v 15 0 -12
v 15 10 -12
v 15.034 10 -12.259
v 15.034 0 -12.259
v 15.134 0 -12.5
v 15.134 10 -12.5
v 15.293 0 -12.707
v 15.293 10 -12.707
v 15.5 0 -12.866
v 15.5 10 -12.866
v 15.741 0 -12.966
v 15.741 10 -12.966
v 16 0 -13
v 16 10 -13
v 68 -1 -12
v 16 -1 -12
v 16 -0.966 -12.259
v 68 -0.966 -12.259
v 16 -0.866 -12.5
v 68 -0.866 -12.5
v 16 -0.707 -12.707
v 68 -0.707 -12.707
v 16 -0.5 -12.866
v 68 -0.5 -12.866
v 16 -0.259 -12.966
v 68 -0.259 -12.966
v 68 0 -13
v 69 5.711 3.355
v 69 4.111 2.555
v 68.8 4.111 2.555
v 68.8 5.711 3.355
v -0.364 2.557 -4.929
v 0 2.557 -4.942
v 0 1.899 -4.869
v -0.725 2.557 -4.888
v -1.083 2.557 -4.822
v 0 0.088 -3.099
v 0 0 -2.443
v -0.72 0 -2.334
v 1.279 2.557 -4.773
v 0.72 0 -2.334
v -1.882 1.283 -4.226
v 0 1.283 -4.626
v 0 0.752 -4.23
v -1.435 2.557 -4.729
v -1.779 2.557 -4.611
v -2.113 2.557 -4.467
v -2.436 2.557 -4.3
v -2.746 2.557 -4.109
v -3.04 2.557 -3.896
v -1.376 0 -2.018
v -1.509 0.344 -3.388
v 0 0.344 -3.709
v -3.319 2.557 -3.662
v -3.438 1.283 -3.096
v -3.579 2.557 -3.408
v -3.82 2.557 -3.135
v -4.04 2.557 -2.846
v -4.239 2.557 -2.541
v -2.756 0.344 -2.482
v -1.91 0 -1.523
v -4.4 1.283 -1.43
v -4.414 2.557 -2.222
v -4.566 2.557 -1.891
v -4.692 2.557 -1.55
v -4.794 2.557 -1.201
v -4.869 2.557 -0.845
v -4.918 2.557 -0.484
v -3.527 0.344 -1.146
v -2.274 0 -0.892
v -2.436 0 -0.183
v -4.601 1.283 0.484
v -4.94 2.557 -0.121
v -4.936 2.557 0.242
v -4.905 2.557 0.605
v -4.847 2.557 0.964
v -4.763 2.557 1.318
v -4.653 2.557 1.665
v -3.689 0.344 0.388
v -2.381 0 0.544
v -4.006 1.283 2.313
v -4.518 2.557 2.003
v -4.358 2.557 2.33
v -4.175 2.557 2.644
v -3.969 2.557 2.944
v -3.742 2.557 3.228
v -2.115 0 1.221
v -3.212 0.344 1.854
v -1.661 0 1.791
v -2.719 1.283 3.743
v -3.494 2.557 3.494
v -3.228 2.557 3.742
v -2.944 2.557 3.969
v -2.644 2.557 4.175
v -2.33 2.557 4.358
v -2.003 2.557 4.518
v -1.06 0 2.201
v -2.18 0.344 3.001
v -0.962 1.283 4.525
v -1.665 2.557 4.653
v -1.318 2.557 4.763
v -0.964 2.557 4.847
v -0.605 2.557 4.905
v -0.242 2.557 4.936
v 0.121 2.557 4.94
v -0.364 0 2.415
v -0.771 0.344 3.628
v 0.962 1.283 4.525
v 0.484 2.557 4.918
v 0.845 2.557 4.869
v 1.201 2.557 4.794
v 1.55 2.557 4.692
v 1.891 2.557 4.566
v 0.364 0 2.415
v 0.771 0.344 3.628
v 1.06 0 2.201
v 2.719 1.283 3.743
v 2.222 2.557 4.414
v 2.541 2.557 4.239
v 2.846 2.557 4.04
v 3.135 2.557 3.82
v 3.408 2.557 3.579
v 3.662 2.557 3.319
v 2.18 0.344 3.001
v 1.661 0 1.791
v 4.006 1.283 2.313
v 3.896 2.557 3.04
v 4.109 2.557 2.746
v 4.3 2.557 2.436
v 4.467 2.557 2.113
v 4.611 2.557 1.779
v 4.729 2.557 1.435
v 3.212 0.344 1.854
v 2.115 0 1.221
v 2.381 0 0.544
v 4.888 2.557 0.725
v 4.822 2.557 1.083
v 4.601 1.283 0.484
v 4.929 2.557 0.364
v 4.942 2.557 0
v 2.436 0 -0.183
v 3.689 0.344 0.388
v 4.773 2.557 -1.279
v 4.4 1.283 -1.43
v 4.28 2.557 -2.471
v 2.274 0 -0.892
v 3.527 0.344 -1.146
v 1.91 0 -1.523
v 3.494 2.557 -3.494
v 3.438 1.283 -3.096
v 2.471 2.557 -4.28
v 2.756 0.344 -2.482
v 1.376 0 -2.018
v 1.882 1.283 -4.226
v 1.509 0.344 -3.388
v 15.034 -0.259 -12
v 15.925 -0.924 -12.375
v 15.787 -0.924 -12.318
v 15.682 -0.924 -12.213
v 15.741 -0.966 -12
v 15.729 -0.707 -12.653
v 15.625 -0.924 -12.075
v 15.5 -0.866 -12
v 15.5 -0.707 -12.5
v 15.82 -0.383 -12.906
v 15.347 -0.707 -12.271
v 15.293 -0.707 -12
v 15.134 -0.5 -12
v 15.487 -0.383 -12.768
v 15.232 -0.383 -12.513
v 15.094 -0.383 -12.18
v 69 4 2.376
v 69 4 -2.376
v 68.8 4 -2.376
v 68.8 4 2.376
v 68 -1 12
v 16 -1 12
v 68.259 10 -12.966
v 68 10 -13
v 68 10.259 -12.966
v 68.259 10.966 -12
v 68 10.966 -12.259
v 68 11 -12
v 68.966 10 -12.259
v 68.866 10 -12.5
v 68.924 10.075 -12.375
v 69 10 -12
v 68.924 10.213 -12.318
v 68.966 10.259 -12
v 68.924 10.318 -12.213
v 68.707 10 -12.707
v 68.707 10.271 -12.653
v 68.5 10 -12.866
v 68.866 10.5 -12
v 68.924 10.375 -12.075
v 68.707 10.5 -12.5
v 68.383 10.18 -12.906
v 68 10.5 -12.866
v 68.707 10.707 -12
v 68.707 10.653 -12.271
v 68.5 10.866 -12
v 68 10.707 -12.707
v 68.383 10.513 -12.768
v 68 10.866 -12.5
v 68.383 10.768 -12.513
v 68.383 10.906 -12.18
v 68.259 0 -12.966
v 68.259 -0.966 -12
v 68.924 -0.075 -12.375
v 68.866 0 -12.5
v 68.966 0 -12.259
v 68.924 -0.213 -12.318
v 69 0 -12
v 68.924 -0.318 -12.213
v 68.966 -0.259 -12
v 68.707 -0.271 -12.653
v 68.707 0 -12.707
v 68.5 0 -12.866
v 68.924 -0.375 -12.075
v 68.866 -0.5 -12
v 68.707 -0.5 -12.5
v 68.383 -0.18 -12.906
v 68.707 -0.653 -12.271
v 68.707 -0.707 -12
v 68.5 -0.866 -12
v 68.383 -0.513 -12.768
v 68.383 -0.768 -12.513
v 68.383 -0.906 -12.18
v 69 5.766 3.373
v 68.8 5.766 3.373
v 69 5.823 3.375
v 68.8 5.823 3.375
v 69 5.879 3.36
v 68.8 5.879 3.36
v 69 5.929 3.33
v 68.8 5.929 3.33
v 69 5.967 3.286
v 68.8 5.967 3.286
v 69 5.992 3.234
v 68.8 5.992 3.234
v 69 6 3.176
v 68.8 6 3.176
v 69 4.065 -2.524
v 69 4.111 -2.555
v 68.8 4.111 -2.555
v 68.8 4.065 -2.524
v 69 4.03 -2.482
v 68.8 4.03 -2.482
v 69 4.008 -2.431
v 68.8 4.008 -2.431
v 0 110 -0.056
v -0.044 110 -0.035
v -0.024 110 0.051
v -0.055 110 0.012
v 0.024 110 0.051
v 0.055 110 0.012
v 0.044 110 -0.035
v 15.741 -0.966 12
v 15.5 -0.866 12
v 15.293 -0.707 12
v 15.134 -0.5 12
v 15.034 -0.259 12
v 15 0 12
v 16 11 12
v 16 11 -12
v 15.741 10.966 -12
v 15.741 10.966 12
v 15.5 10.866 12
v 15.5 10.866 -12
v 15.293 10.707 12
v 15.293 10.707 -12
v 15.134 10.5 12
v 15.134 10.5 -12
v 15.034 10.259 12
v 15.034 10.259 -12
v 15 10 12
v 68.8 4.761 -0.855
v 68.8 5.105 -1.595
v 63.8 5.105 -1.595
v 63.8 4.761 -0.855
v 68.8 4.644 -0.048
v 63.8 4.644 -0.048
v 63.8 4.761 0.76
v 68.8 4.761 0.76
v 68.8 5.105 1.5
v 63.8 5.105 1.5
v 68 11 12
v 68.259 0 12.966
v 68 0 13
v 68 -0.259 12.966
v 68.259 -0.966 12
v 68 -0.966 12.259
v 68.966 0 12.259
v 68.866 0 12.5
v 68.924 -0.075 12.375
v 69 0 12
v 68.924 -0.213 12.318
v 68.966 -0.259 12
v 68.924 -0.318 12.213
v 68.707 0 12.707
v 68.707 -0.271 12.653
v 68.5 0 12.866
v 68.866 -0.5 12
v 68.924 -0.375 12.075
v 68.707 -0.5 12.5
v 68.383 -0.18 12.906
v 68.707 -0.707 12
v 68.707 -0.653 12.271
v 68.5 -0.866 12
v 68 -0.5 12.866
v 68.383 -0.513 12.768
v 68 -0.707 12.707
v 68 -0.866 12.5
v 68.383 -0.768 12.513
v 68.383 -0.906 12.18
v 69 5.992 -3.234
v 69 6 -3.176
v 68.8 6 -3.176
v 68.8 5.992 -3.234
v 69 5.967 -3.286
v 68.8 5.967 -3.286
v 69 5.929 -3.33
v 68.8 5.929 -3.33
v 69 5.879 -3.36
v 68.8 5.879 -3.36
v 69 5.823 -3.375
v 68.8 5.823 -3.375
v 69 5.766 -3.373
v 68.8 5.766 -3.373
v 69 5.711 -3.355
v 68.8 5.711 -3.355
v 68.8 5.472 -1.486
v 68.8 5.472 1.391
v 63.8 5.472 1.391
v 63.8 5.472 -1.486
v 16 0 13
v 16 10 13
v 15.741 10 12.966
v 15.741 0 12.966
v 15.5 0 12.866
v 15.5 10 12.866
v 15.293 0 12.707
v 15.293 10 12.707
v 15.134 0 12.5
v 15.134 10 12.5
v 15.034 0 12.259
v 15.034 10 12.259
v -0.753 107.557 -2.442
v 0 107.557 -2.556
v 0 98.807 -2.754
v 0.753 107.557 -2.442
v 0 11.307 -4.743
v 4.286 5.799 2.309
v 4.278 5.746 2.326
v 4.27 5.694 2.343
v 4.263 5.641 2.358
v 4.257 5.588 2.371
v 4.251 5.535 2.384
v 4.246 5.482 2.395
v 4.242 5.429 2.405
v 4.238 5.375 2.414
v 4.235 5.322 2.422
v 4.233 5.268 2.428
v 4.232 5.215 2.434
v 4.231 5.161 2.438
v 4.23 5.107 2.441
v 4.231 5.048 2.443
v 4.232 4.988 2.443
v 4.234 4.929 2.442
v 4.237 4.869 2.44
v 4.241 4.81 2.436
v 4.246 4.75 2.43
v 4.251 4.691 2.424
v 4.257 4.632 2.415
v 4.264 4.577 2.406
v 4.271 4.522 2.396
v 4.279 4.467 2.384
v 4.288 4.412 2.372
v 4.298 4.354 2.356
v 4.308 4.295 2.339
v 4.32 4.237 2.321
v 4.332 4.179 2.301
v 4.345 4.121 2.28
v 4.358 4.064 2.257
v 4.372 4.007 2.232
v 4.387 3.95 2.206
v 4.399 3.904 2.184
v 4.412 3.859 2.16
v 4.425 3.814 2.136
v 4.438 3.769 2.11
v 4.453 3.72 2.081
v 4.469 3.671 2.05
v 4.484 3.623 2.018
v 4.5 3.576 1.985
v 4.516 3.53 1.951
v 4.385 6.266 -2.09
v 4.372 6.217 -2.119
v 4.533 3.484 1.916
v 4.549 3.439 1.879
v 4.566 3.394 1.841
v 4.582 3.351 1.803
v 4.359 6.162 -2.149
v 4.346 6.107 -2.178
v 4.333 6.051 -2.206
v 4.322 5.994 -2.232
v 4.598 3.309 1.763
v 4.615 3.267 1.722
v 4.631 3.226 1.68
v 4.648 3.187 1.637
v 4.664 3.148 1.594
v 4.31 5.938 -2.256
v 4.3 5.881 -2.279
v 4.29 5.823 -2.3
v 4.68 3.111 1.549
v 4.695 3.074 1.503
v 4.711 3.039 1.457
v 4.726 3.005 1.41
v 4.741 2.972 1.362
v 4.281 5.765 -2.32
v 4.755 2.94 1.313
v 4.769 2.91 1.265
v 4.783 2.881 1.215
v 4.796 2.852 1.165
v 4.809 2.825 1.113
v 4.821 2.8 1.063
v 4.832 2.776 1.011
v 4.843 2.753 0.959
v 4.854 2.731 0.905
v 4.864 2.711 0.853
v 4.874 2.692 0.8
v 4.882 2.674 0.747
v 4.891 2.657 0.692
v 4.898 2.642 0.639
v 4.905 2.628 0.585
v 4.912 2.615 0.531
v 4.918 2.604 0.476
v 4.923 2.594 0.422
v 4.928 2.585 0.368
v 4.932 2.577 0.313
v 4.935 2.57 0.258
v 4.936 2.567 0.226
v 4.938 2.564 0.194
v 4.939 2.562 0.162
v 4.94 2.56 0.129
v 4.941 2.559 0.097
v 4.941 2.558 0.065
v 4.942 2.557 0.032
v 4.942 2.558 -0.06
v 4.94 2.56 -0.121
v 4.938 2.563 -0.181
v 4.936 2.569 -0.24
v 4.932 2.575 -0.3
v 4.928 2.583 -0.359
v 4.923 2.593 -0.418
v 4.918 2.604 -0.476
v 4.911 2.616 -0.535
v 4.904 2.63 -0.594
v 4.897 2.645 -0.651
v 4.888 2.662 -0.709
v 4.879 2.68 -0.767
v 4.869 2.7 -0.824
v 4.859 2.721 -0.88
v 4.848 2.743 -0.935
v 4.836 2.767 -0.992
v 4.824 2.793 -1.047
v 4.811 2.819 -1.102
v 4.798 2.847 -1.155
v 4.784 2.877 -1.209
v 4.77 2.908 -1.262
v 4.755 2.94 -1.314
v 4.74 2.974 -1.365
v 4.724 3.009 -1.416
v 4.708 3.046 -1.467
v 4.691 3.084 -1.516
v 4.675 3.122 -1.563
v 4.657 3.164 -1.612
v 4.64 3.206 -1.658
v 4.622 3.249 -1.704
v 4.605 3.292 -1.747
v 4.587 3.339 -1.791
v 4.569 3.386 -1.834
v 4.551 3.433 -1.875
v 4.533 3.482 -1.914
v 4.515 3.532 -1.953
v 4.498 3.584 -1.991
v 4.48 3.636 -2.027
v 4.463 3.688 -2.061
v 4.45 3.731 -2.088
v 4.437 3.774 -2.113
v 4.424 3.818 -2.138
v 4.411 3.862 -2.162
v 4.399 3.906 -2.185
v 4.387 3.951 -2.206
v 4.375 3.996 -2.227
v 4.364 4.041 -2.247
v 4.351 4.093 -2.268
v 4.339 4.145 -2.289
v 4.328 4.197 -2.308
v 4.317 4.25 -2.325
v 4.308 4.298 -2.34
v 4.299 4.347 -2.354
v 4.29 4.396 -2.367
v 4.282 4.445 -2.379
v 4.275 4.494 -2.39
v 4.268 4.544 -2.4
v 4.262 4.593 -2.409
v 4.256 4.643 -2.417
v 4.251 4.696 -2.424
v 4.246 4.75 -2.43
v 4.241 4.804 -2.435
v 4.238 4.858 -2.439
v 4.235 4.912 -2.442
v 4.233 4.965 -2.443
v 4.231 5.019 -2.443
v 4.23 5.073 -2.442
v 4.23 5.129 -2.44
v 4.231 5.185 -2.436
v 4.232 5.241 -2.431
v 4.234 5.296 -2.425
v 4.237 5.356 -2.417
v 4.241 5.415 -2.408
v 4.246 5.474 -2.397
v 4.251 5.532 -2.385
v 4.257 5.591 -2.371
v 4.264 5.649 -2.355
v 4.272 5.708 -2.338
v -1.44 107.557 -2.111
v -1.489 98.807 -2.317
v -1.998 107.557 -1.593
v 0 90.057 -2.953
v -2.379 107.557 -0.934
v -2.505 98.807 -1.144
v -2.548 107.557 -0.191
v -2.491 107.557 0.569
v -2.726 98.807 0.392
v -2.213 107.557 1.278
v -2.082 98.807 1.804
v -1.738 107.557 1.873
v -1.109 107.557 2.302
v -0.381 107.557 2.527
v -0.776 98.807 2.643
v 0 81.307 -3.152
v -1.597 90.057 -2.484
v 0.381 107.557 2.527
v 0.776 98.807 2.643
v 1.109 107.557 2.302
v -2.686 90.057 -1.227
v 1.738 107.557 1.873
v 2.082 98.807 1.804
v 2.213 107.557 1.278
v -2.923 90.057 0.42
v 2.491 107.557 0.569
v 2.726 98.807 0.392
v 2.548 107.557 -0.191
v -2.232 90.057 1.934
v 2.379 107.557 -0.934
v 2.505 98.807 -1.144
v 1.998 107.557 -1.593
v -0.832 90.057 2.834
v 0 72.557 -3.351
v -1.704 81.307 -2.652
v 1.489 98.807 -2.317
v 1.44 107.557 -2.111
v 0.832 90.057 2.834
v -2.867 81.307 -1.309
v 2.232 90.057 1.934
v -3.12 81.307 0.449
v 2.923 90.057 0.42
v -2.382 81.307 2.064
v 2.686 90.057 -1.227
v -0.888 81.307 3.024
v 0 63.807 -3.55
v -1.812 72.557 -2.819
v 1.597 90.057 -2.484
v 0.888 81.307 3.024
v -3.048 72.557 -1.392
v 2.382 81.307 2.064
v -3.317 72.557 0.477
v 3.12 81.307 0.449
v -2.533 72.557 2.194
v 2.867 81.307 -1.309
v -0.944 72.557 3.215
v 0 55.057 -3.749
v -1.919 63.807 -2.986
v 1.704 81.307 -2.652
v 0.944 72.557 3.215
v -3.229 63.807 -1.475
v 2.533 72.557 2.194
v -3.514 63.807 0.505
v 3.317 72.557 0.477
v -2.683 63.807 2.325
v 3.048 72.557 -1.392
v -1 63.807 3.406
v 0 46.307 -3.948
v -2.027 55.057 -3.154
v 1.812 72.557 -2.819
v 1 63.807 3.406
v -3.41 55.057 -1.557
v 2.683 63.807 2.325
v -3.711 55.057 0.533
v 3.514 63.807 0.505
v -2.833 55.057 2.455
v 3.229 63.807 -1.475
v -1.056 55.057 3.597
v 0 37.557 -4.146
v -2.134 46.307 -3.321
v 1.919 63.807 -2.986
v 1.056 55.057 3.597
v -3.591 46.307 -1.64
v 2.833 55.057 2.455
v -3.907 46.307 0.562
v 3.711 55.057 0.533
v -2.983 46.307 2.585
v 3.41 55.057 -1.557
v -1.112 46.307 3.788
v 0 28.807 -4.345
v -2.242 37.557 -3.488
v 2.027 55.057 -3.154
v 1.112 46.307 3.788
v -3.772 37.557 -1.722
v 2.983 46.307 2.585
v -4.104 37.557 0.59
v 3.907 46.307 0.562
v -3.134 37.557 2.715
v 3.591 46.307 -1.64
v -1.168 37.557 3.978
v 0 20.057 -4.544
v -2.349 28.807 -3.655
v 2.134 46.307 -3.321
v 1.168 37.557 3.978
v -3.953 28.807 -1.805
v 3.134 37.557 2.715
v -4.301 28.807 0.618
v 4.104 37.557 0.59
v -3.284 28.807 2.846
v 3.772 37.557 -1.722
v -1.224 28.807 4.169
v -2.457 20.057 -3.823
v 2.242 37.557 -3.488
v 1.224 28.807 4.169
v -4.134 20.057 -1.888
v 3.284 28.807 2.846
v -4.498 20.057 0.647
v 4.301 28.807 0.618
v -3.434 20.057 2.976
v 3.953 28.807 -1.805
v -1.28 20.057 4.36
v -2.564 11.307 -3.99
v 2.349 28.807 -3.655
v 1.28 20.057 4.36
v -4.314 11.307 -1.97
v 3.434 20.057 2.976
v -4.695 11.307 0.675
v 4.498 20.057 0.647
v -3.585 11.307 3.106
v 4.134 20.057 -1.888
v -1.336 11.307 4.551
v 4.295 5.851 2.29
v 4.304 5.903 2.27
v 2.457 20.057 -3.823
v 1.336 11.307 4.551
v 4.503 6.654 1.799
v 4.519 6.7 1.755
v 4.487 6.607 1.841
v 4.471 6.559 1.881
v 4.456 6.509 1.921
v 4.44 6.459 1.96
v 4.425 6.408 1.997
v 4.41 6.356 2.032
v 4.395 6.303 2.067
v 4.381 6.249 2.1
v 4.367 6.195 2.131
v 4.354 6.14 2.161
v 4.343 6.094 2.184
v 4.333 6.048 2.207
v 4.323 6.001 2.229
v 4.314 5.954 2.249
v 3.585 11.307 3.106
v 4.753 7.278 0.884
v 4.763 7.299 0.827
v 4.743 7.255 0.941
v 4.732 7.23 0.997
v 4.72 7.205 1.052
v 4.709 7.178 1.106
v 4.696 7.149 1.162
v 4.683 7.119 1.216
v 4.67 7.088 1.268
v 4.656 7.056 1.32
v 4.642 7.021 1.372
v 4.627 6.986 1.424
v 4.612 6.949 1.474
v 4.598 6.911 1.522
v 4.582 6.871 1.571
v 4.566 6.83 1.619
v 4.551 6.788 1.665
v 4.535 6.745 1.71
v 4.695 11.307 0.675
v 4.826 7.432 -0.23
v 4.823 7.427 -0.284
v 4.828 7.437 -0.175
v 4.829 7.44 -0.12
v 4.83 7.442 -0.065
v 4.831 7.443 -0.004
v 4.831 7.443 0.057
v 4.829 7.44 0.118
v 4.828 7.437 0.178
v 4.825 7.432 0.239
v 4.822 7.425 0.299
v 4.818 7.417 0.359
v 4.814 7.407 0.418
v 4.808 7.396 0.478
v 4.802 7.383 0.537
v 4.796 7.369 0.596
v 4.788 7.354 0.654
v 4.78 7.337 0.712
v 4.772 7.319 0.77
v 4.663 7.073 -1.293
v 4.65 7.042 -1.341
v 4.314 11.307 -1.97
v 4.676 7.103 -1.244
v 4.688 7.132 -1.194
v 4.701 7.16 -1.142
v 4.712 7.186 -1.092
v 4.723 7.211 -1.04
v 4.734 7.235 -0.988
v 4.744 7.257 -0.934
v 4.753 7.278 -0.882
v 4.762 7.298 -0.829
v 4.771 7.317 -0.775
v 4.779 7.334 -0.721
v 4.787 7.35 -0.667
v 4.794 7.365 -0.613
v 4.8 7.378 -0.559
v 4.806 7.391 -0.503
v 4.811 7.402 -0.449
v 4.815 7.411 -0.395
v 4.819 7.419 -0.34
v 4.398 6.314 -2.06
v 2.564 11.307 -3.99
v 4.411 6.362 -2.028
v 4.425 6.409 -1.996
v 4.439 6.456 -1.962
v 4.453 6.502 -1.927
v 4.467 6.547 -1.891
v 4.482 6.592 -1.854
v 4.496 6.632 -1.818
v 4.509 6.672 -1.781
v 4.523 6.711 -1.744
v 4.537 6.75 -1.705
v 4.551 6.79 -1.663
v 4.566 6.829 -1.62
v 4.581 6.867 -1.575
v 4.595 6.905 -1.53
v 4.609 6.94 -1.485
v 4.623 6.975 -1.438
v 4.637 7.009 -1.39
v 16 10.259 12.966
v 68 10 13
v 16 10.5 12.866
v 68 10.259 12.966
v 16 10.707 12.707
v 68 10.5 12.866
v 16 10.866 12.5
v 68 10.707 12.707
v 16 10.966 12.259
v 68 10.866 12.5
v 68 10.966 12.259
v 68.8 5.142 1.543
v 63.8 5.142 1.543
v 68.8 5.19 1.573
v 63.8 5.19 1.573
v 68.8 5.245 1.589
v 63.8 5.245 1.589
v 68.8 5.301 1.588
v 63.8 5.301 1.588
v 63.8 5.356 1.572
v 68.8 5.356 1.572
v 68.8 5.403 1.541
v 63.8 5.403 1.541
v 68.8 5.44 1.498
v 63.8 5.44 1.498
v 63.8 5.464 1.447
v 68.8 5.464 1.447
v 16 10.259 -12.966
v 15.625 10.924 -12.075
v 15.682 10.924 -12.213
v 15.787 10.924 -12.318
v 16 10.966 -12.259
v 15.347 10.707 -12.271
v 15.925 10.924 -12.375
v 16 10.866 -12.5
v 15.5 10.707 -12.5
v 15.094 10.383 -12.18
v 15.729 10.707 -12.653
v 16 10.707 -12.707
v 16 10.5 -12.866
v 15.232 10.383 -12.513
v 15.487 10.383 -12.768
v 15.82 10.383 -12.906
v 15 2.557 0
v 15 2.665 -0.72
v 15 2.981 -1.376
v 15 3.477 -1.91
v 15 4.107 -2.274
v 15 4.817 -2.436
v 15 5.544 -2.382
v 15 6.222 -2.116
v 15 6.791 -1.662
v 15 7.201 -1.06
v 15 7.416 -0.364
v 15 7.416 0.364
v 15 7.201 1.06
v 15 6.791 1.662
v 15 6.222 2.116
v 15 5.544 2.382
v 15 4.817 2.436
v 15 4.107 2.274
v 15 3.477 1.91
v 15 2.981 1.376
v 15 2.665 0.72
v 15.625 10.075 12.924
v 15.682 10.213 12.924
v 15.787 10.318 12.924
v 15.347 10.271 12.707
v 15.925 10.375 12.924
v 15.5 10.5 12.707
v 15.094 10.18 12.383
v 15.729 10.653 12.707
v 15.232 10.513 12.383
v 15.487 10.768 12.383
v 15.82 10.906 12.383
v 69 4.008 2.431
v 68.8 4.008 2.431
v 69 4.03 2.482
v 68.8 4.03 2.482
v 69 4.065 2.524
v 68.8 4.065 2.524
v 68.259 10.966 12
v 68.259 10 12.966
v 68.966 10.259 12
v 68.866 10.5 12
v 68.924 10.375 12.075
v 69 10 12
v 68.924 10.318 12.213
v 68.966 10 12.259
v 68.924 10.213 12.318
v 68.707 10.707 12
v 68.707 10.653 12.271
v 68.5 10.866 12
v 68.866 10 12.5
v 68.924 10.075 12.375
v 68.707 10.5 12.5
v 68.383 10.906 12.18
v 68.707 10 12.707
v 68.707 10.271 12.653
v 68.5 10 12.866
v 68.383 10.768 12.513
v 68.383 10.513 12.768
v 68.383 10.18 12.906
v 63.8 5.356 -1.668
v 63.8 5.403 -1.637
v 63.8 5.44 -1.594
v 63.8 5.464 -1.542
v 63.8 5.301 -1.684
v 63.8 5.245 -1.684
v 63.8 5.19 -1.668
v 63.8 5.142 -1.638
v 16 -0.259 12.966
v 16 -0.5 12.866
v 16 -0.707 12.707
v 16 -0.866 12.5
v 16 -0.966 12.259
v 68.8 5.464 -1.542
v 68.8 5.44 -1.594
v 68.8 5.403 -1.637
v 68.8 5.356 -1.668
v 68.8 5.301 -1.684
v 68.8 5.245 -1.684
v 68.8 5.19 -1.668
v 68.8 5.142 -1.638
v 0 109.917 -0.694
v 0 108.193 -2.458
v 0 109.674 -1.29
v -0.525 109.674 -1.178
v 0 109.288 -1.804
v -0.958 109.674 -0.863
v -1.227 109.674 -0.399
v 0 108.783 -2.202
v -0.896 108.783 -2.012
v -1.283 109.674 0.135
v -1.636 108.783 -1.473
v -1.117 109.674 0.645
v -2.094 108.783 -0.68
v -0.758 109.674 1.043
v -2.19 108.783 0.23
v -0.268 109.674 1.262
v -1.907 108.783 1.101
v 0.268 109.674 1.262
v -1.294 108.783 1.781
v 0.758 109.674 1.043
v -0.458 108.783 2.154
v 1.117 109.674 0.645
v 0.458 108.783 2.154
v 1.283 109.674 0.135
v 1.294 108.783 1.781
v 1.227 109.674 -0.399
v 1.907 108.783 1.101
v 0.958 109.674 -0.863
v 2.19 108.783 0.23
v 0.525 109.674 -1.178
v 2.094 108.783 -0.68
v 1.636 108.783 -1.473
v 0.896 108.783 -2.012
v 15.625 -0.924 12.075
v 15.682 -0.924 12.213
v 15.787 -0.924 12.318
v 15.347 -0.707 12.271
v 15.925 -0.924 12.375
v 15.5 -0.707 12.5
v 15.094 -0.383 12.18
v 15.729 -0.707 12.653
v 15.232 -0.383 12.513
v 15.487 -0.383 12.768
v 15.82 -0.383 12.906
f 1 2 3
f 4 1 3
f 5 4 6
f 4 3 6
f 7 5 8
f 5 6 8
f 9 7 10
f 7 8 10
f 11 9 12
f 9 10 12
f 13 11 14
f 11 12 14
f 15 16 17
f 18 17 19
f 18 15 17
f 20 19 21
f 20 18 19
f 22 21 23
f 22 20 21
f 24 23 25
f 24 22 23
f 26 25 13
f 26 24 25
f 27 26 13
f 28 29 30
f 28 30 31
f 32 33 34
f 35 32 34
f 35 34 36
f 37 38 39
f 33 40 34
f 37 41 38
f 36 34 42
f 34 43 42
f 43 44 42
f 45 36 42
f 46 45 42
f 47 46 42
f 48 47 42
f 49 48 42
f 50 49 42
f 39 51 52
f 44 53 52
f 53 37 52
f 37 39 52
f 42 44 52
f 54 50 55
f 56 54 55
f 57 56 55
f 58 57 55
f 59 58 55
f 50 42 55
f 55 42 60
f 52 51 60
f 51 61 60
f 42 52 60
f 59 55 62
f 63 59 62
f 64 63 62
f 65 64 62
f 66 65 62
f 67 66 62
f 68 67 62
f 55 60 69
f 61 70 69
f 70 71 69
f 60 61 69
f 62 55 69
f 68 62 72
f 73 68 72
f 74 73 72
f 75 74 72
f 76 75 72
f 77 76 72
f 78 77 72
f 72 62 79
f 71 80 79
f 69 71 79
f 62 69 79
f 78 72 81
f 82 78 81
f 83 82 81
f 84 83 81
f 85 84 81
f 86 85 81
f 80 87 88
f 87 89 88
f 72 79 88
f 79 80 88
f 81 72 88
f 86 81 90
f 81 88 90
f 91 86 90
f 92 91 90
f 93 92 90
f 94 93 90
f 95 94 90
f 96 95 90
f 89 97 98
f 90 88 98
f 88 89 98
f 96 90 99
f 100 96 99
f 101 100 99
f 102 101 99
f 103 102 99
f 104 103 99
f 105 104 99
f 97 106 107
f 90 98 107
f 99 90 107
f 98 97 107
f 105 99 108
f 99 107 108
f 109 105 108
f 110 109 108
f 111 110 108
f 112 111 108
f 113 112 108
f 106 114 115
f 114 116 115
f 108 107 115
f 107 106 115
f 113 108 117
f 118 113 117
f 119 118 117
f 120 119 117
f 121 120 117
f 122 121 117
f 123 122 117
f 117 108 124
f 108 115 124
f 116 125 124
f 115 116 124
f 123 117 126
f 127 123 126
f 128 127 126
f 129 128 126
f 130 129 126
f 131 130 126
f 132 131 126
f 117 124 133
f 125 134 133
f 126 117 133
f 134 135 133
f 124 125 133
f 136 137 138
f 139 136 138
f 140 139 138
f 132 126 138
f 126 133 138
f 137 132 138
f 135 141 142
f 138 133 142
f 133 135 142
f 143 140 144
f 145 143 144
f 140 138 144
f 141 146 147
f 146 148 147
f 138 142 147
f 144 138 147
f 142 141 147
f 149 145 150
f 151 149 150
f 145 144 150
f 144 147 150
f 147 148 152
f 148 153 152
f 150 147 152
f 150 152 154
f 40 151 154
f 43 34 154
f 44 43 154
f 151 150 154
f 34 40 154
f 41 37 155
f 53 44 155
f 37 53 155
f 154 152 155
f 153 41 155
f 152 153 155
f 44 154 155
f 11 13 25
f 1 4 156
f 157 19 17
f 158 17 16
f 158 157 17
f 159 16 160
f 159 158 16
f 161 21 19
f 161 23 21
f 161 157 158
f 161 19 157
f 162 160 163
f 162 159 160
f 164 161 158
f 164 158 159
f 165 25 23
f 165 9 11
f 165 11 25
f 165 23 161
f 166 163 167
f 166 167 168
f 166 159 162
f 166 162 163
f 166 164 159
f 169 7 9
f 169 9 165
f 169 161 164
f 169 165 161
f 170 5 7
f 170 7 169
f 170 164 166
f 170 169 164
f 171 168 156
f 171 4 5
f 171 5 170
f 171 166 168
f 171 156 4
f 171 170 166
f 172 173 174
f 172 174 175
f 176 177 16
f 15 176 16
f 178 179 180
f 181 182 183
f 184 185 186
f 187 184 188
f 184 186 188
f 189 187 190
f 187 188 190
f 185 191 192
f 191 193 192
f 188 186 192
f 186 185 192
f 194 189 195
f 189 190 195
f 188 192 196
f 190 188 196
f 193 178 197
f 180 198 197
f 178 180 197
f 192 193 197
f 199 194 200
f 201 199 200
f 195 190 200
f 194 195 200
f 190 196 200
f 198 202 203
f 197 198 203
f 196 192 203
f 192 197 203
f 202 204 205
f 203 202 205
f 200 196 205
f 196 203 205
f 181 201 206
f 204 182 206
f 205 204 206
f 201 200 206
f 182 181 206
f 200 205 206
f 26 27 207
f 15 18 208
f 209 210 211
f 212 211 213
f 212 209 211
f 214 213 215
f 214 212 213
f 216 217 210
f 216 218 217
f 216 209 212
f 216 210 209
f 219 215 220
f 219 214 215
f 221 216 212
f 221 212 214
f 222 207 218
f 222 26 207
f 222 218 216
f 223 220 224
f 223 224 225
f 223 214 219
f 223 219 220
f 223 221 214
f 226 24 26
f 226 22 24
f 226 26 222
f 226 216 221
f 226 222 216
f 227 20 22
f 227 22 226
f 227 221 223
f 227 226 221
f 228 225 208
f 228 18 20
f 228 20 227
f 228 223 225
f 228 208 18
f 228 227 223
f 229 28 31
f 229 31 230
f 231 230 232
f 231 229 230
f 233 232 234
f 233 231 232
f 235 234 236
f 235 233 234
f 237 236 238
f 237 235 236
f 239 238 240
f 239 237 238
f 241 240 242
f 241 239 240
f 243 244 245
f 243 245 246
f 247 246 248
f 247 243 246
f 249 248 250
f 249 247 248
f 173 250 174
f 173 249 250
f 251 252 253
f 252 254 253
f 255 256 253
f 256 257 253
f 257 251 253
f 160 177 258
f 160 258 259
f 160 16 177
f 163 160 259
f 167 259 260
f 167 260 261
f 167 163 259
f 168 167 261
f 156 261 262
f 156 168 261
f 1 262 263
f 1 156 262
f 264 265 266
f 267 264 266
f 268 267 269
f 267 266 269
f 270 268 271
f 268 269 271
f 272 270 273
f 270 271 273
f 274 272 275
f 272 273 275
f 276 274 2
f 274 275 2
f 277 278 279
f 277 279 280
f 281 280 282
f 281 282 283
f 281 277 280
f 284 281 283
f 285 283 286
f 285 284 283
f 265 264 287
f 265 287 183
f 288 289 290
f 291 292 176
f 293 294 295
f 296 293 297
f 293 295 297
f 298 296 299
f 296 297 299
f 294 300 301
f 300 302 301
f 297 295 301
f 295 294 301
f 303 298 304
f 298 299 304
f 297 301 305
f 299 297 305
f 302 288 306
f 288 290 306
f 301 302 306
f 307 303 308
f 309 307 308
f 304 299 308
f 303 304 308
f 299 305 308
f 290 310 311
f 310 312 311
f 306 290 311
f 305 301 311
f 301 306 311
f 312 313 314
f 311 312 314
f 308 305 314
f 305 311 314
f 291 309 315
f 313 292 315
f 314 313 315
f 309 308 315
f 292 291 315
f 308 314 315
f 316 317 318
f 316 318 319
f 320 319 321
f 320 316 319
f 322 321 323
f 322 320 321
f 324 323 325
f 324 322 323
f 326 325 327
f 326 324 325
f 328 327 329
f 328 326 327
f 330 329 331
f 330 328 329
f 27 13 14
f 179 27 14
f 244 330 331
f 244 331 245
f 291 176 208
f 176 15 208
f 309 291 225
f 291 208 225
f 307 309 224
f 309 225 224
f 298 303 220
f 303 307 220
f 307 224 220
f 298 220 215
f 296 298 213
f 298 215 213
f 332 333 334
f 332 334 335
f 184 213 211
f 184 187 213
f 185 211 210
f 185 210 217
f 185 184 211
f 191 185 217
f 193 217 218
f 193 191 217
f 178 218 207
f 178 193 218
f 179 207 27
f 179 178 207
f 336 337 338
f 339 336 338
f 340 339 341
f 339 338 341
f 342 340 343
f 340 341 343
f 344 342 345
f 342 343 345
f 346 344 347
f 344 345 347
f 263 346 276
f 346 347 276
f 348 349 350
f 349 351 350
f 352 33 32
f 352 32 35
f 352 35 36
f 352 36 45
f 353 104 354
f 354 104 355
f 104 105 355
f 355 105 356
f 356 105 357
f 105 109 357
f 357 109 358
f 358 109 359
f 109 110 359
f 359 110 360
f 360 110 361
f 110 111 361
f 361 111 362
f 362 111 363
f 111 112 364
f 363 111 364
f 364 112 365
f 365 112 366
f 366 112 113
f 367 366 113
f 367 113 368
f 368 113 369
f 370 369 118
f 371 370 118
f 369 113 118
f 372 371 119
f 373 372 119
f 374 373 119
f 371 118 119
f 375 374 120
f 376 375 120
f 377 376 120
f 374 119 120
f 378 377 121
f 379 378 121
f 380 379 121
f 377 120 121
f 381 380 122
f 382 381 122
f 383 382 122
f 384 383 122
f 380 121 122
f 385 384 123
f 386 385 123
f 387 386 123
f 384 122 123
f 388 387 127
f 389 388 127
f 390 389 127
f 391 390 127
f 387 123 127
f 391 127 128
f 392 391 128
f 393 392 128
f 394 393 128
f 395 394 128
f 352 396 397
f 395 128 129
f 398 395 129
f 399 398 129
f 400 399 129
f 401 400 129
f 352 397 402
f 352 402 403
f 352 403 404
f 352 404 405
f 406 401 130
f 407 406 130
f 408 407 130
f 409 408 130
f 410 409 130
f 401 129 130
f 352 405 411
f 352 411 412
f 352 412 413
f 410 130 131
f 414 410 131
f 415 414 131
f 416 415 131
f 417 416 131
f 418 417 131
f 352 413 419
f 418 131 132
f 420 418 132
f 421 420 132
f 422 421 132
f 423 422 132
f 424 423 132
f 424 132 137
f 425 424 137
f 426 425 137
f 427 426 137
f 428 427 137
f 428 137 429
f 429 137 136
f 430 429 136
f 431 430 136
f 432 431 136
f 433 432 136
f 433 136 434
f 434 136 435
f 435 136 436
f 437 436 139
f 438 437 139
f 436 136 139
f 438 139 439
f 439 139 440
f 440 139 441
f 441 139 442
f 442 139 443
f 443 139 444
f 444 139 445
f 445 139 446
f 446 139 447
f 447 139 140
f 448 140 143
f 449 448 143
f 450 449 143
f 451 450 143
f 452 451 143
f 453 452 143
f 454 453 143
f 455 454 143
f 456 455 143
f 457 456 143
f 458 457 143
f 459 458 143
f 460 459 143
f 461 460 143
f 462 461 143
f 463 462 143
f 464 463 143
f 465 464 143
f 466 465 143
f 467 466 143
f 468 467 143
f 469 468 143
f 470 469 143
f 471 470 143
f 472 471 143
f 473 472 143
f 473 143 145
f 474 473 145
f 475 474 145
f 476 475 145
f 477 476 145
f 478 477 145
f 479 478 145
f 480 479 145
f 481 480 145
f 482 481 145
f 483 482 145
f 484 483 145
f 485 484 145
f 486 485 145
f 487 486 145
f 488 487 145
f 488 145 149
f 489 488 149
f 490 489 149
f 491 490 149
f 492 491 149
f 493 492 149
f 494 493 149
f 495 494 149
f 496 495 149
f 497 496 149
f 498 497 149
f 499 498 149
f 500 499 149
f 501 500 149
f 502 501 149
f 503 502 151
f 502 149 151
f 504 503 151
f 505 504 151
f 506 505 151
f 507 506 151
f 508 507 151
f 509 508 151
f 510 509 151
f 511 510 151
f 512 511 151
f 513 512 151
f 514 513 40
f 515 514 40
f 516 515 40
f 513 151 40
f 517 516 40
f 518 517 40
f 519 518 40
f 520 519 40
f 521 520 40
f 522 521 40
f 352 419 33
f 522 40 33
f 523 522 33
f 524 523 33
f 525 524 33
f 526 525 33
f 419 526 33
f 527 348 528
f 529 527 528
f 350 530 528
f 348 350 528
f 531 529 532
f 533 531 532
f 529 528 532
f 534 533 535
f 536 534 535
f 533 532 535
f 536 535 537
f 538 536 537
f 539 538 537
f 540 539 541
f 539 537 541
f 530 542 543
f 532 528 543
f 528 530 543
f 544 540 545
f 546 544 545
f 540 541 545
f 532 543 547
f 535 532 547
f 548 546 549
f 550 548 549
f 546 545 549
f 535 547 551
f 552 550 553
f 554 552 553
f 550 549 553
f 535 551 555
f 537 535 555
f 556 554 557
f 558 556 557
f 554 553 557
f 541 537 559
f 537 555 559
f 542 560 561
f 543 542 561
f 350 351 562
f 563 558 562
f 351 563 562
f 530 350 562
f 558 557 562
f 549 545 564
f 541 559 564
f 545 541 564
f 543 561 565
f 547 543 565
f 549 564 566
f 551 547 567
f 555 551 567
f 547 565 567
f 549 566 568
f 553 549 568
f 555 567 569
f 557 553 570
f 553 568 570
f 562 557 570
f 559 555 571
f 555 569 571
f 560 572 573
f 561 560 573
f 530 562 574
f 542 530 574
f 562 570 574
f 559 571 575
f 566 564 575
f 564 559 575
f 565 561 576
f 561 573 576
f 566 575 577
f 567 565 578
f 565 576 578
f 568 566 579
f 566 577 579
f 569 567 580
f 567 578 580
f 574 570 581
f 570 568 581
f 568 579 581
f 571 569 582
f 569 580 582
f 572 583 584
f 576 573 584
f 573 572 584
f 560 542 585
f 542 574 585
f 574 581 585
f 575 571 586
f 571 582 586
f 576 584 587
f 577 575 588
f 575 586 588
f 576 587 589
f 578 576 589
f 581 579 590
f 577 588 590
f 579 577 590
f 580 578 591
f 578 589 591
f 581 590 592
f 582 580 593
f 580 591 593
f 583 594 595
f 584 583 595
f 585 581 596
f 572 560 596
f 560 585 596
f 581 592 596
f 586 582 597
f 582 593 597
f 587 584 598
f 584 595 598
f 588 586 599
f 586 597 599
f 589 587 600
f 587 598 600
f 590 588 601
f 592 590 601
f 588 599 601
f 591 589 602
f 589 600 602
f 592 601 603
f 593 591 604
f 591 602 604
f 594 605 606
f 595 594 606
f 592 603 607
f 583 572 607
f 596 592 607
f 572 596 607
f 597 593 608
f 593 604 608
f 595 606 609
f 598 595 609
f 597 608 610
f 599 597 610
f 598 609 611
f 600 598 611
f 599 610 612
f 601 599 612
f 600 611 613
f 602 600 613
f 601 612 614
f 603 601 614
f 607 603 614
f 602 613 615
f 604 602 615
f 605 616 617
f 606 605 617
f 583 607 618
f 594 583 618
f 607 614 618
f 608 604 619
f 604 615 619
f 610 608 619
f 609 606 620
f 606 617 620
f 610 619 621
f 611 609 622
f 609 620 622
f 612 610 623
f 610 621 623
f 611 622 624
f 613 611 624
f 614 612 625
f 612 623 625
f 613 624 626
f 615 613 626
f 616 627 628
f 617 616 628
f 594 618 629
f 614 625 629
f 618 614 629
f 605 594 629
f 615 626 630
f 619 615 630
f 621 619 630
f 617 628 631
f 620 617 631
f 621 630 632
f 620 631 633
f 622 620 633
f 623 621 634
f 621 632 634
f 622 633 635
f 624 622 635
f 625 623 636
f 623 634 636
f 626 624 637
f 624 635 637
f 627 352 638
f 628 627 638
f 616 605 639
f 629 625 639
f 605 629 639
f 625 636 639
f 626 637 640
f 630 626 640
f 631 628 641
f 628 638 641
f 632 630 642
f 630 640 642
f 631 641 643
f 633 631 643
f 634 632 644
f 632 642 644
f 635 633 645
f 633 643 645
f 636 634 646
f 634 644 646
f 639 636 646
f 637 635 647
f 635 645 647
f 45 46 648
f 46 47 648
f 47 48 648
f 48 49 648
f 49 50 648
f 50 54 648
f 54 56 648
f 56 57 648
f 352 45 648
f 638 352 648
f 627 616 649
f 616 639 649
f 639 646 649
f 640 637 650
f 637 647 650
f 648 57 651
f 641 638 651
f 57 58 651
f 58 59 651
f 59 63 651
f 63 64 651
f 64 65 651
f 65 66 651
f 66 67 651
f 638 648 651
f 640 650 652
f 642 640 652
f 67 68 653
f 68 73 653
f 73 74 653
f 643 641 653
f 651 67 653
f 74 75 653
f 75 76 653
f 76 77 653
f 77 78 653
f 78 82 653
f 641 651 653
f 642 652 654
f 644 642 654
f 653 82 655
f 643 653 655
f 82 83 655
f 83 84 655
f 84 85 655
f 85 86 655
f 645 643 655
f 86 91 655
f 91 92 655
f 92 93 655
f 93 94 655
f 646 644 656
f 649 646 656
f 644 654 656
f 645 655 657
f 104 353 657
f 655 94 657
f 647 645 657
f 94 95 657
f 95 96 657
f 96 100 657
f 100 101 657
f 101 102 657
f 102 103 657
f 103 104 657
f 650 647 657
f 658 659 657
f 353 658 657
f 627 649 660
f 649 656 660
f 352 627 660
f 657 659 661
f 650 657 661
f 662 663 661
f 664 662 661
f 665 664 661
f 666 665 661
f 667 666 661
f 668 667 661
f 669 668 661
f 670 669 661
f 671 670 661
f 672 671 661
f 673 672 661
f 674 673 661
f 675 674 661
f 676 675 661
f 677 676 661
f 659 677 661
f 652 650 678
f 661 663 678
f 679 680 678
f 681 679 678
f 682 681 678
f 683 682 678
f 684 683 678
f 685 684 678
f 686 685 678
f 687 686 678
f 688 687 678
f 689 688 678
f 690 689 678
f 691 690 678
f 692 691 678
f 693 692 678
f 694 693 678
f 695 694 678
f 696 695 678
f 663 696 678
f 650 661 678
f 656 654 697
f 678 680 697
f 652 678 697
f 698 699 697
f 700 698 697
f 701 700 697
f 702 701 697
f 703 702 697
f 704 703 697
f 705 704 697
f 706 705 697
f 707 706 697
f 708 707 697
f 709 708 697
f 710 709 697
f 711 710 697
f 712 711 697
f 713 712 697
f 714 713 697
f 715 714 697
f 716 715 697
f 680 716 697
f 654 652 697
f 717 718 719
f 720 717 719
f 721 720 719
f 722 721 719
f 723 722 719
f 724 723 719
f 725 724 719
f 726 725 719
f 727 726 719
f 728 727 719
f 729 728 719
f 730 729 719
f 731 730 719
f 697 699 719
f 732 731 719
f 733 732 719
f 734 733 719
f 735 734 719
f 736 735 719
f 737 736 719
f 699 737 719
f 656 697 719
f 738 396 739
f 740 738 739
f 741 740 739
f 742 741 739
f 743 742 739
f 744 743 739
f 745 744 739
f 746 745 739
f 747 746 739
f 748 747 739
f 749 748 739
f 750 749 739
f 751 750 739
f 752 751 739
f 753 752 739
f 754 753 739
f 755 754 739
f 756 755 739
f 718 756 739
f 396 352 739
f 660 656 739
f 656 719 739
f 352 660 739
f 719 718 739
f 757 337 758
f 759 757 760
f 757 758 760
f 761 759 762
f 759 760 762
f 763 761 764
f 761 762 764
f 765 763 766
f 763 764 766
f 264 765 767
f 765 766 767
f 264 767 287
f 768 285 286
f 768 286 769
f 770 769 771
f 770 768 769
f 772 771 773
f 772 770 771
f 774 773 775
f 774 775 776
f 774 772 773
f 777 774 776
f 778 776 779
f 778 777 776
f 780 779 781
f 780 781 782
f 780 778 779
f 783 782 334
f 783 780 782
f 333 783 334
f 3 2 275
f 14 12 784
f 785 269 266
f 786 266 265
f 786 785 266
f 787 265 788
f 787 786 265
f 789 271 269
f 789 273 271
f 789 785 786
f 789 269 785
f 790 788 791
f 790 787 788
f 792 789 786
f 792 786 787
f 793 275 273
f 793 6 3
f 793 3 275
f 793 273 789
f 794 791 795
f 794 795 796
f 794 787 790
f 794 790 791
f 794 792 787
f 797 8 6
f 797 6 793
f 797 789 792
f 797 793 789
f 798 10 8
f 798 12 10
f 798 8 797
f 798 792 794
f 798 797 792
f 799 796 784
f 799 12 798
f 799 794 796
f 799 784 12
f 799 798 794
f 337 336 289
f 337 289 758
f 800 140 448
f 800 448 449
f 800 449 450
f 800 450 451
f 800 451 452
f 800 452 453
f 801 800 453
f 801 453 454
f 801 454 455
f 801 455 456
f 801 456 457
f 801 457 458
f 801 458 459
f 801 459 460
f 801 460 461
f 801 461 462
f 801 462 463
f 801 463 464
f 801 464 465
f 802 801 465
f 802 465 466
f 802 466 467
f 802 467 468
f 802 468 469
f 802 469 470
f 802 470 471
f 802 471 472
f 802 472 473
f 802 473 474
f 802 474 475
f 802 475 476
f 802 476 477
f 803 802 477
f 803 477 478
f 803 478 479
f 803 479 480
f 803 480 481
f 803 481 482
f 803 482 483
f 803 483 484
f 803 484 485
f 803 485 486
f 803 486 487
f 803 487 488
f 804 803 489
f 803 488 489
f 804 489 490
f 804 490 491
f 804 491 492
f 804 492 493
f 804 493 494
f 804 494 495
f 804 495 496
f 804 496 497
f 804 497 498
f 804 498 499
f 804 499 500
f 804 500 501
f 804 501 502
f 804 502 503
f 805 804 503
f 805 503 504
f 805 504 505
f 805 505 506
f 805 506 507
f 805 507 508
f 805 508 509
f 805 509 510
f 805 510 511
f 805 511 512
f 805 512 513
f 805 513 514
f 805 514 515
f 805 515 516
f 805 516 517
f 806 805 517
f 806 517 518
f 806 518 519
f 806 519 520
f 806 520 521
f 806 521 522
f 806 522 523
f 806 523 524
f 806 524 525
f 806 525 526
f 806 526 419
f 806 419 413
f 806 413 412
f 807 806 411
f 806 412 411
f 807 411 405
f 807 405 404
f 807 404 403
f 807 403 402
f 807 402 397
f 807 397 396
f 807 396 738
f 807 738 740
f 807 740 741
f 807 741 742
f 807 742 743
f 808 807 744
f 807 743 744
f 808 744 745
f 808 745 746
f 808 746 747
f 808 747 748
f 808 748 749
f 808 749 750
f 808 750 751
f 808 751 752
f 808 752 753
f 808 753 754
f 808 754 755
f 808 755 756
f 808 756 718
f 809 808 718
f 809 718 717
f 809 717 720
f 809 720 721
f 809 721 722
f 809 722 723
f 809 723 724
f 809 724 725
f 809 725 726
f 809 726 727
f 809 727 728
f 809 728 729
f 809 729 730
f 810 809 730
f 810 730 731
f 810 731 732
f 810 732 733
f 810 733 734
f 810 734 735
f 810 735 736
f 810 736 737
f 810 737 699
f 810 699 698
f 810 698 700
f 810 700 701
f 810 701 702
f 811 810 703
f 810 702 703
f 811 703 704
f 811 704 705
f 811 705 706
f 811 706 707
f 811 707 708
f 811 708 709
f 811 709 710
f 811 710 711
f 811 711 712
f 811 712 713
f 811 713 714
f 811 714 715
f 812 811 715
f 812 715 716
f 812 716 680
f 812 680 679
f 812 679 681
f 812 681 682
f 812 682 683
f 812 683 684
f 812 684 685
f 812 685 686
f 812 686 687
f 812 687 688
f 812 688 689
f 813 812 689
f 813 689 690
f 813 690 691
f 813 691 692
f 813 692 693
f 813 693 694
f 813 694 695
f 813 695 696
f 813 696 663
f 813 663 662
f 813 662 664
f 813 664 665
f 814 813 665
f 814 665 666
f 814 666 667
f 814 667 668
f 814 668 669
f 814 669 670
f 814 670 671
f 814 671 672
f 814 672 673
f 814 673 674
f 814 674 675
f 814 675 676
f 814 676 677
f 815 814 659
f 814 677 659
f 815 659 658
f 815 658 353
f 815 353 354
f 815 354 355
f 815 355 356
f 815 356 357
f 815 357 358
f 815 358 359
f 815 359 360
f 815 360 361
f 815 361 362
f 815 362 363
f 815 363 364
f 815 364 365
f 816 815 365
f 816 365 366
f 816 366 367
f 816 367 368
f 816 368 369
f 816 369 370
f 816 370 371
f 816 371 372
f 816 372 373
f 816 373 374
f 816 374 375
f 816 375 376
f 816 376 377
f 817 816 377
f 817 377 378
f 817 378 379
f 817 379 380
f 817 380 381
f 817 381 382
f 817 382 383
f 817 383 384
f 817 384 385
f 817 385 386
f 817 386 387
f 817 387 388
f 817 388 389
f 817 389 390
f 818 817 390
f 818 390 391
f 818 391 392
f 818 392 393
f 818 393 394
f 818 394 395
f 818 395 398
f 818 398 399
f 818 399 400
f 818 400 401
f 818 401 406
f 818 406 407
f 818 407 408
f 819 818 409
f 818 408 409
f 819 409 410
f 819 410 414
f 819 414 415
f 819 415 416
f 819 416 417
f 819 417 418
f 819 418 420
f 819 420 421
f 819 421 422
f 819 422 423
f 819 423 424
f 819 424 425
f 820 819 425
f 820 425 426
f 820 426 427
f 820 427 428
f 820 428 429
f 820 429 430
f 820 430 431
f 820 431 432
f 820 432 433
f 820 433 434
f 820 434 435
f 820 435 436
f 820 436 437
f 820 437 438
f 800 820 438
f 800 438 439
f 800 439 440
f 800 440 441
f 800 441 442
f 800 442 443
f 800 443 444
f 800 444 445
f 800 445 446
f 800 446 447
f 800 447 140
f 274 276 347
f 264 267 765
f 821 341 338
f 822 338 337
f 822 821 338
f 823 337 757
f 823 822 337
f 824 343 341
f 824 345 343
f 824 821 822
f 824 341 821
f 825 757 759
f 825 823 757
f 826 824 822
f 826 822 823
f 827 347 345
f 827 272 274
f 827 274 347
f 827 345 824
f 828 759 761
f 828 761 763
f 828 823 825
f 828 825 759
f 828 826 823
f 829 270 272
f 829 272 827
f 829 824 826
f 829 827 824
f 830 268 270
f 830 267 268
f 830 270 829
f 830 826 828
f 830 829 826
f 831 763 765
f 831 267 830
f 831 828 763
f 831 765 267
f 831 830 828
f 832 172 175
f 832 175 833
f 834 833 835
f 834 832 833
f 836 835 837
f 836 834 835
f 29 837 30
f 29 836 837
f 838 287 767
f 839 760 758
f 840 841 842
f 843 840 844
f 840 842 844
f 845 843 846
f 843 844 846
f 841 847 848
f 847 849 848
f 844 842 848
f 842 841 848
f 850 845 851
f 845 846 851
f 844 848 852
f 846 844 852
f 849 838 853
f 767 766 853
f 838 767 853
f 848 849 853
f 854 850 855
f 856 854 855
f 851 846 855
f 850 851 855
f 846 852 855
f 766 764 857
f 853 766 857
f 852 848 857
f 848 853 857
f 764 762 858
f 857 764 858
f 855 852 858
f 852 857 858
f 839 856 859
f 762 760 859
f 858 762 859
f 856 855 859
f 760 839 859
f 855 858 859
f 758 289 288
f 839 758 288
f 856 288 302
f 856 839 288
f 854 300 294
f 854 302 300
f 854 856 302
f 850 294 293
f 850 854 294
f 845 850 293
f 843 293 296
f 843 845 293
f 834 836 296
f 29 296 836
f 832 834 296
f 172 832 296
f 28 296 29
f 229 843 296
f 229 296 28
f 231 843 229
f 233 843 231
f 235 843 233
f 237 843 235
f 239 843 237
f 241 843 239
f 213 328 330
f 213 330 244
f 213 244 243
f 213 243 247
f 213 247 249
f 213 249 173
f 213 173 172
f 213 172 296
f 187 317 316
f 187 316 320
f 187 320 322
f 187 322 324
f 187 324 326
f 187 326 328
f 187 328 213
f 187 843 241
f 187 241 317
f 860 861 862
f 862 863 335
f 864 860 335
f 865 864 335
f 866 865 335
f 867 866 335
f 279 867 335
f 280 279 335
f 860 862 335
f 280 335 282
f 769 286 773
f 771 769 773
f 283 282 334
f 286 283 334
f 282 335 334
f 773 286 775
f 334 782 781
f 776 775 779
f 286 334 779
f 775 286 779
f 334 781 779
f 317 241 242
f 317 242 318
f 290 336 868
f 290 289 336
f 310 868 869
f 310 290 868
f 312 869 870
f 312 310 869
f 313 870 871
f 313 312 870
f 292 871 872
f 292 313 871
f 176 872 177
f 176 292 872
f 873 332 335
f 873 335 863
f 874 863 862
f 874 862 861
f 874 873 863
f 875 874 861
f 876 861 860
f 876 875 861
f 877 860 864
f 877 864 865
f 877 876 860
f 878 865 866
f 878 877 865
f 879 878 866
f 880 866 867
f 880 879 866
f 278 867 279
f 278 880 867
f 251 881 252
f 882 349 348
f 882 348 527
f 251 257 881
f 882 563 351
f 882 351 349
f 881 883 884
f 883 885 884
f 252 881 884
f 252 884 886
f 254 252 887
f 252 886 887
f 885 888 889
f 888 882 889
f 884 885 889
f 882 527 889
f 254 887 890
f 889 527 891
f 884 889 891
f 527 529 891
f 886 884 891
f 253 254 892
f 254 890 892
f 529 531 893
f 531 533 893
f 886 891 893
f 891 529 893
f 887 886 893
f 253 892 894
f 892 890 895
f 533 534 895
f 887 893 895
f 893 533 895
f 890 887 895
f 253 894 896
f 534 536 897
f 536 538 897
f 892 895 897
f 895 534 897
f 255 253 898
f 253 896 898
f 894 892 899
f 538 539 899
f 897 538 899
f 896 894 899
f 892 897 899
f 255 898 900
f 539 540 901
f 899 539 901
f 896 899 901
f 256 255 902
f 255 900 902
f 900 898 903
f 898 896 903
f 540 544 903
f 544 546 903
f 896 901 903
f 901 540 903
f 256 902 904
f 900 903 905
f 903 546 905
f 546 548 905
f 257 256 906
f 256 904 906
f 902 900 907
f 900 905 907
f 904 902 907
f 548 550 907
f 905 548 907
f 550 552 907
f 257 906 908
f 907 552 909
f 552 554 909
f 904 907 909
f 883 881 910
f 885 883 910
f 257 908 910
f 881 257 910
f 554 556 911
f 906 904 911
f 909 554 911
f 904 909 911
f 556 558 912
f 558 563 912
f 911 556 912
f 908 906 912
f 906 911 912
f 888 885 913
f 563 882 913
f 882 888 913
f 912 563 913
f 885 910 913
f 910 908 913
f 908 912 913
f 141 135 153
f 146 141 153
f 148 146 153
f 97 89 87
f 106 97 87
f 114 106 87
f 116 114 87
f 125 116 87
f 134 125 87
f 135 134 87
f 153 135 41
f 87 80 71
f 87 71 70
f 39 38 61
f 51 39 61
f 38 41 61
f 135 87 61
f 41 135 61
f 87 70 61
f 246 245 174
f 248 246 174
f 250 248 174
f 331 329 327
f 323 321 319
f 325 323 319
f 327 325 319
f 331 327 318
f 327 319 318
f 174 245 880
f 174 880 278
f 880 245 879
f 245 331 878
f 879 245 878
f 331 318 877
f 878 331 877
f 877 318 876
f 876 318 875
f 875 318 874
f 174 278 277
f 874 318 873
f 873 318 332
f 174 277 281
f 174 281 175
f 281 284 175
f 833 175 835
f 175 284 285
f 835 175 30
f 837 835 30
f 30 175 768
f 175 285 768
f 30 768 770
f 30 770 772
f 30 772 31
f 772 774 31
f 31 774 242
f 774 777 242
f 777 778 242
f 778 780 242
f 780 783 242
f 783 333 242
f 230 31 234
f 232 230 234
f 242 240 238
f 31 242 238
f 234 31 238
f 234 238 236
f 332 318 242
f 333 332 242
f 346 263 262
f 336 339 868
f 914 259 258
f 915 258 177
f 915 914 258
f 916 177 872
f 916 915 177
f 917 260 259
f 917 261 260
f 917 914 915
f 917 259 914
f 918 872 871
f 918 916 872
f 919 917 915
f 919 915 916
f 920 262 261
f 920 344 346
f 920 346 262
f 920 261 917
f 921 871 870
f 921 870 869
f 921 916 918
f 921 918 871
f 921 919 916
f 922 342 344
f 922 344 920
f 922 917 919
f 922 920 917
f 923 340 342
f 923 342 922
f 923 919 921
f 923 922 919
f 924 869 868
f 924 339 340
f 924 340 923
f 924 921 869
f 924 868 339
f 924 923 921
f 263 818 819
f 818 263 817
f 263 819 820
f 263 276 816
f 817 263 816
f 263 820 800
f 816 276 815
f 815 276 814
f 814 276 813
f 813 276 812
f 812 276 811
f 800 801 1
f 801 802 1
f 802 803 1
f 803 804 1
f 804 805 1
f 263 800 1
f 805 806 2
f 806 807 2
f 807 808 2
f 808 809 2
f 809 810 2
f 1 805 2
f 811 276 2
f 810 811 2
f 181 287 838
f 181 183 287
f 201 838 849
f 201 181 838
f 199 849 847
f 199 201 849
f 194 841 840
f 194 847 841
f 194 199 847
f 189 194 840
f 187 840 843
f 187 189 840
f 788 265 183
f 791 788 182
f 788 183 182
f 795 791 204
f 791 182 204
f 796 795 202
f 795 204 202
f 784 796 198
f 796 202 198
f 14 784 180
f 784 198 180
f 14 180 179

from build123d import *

# Parameters (mm, degrees)
FILLET1_R           = 2.5
SKETCH2_R           = 2.443196487
BOSS_EXTRUDE1_DEPTH = 15
SKETCH3_W           = 26
SKETCH3_H           = 12
BOSS_EXTRUDE2_DEPTH = 54
FILLET2_R           = 1
CUT_EXTRUDE3_DEPTH  = 0.2
CUT_EXTRUDE4_DEPTH  = 5


with BuildPart() as part:
    # Sketch1 → Revolve1 (revolve)
    with BuildSketch(Plane.XY, mode=Mode.PRIVATE) as revolve1_sk:
        Polygon((0, 0), (0, 110), (2.5, 110), (5, 0), align=None)
    revolve(revolve1_sk.sketch.rotate(Axis((0, 0, 0), (0, 1, 0)), 90), axis=Axis((0, 0, 0), (0, 1, 0)))

    # Fillet1
    fillet1_edges = [part.edges().sort_by_distance(p)[0] for p in [
        (0, 110, 2.5),
        (0, 0, 5),
    ]]
    fillet(fillet1_edges, radius=FILLET1_R)

    # Sketch2 → Boss-Extrude1 (add)
    with BuildSketch(Plane(origin=(0, 0, 0), x_dir=(0, 0, -1), z_dir=(1, 0, 0))):
        with Locations(Location((0, 5, 0), (0, 0, 269.999999999))):
            Circle(SKETCH2_R)
    extrude(amount=BOSS_EXTRUDE1_DEPTH)

    # Sketch3 → Boss-Extrude2 (add)
    with BuildSketch(Plane(origin=(15, 0, 0), x_dir=(0, 0, -1), z_dir=(1, 0, 0))):
        with Locations((0, 5)):
            Rectangle(SKETCH3_W, SKETCH3_H)
    extrude(amount=BOSS_EXTRUDE2_DEPTH)

    # Fillet2
    fillet2_edges = [part.edges().sort_by_distance(p)[0] for p in [
        (15, 5, -13),
        (42, -1, -13),
        (15, 11, 0),
        (42, 11, -13),
        (15, 5, 13),
        (42, 11, 13),
        (15, -1, 0),
        (42, -1, 13),
        (69, 5, -13),
        (69, 11, 0),
        (69, 5, 13),
        (69, -1, 0),
    ]]
    fillet(fillet2_edges, radius=FILLET2_R)

    # Sketch6 → Cut-Extrude3 (cut)
    with BuildSketch(Plane(origin=(69, 0, 0), x_dir=(0, 0, -1), z_dir=(1, 0, 0))):
        with BuildLine():
            Line((-3.176393202, 6), (3.176393202, 6))
            ThreePointArc((3.176393202, 6), (3.346523364, 5.905146222), (3.35527864, 5.710557281))
            Line((3.35527864, 5.710557281), (2.55527864, 4.110557281))
            ThreePointArc((2.55527864, 4.110557281), (2.481539425, 4.029869838), (2.376393202, 4))
            Line((2.376393202, 4), (-2.376393202, 4))
            ThreePointArc((-2.376393202, 4), (-2.481539425, 4.029869838), (-2.55527864, 4.110557281))
            Line((-2.55527864, 4.110557281), (-3.35527864, 5.710557281))
            ThreePointArc((-3.35527864, 5.710557281), (-3.346523364, 5.905146222), (-3.176393202, 6))
        make_face()
    extrude(amount=-CUT_EXTRUDE3_DEPTH, mode=Mode.SUBTRACT)

    # Sketch8 → Cut-Extrude4 (cut)
    with BuildSketch(Plane(origin=(68.8, 0, 0), x_dir=(0, 0, -1), z_dir=(1, 0, 0))):
        with BuildLine():
            Line((0.047682537, 5.471989403), (1.485955512, 5.471989403))
            ThreePointArc((1.485955512, 5.471989403), (1.677632452, 5.32908538), (1.595395333, 5.104588908))
            ThreePointArc((1.595395333, 5.104588908), (0.047682537, 4.643562278), (-1.500030259, 5.104588908))
            ThreePointArc((-1.500030259, 5.104588908), (-1.582267378, 5.32908538), (-1.390590438, 5.471989403))
            Line((-1.390590438, 5.471989403), (0.047682537, 5.471989403))
        make_face()
    extrude(amount=-CUT_EXTRUDE4_DEPTH, mode=Mode.SUBTRACT)


solid = part.part
